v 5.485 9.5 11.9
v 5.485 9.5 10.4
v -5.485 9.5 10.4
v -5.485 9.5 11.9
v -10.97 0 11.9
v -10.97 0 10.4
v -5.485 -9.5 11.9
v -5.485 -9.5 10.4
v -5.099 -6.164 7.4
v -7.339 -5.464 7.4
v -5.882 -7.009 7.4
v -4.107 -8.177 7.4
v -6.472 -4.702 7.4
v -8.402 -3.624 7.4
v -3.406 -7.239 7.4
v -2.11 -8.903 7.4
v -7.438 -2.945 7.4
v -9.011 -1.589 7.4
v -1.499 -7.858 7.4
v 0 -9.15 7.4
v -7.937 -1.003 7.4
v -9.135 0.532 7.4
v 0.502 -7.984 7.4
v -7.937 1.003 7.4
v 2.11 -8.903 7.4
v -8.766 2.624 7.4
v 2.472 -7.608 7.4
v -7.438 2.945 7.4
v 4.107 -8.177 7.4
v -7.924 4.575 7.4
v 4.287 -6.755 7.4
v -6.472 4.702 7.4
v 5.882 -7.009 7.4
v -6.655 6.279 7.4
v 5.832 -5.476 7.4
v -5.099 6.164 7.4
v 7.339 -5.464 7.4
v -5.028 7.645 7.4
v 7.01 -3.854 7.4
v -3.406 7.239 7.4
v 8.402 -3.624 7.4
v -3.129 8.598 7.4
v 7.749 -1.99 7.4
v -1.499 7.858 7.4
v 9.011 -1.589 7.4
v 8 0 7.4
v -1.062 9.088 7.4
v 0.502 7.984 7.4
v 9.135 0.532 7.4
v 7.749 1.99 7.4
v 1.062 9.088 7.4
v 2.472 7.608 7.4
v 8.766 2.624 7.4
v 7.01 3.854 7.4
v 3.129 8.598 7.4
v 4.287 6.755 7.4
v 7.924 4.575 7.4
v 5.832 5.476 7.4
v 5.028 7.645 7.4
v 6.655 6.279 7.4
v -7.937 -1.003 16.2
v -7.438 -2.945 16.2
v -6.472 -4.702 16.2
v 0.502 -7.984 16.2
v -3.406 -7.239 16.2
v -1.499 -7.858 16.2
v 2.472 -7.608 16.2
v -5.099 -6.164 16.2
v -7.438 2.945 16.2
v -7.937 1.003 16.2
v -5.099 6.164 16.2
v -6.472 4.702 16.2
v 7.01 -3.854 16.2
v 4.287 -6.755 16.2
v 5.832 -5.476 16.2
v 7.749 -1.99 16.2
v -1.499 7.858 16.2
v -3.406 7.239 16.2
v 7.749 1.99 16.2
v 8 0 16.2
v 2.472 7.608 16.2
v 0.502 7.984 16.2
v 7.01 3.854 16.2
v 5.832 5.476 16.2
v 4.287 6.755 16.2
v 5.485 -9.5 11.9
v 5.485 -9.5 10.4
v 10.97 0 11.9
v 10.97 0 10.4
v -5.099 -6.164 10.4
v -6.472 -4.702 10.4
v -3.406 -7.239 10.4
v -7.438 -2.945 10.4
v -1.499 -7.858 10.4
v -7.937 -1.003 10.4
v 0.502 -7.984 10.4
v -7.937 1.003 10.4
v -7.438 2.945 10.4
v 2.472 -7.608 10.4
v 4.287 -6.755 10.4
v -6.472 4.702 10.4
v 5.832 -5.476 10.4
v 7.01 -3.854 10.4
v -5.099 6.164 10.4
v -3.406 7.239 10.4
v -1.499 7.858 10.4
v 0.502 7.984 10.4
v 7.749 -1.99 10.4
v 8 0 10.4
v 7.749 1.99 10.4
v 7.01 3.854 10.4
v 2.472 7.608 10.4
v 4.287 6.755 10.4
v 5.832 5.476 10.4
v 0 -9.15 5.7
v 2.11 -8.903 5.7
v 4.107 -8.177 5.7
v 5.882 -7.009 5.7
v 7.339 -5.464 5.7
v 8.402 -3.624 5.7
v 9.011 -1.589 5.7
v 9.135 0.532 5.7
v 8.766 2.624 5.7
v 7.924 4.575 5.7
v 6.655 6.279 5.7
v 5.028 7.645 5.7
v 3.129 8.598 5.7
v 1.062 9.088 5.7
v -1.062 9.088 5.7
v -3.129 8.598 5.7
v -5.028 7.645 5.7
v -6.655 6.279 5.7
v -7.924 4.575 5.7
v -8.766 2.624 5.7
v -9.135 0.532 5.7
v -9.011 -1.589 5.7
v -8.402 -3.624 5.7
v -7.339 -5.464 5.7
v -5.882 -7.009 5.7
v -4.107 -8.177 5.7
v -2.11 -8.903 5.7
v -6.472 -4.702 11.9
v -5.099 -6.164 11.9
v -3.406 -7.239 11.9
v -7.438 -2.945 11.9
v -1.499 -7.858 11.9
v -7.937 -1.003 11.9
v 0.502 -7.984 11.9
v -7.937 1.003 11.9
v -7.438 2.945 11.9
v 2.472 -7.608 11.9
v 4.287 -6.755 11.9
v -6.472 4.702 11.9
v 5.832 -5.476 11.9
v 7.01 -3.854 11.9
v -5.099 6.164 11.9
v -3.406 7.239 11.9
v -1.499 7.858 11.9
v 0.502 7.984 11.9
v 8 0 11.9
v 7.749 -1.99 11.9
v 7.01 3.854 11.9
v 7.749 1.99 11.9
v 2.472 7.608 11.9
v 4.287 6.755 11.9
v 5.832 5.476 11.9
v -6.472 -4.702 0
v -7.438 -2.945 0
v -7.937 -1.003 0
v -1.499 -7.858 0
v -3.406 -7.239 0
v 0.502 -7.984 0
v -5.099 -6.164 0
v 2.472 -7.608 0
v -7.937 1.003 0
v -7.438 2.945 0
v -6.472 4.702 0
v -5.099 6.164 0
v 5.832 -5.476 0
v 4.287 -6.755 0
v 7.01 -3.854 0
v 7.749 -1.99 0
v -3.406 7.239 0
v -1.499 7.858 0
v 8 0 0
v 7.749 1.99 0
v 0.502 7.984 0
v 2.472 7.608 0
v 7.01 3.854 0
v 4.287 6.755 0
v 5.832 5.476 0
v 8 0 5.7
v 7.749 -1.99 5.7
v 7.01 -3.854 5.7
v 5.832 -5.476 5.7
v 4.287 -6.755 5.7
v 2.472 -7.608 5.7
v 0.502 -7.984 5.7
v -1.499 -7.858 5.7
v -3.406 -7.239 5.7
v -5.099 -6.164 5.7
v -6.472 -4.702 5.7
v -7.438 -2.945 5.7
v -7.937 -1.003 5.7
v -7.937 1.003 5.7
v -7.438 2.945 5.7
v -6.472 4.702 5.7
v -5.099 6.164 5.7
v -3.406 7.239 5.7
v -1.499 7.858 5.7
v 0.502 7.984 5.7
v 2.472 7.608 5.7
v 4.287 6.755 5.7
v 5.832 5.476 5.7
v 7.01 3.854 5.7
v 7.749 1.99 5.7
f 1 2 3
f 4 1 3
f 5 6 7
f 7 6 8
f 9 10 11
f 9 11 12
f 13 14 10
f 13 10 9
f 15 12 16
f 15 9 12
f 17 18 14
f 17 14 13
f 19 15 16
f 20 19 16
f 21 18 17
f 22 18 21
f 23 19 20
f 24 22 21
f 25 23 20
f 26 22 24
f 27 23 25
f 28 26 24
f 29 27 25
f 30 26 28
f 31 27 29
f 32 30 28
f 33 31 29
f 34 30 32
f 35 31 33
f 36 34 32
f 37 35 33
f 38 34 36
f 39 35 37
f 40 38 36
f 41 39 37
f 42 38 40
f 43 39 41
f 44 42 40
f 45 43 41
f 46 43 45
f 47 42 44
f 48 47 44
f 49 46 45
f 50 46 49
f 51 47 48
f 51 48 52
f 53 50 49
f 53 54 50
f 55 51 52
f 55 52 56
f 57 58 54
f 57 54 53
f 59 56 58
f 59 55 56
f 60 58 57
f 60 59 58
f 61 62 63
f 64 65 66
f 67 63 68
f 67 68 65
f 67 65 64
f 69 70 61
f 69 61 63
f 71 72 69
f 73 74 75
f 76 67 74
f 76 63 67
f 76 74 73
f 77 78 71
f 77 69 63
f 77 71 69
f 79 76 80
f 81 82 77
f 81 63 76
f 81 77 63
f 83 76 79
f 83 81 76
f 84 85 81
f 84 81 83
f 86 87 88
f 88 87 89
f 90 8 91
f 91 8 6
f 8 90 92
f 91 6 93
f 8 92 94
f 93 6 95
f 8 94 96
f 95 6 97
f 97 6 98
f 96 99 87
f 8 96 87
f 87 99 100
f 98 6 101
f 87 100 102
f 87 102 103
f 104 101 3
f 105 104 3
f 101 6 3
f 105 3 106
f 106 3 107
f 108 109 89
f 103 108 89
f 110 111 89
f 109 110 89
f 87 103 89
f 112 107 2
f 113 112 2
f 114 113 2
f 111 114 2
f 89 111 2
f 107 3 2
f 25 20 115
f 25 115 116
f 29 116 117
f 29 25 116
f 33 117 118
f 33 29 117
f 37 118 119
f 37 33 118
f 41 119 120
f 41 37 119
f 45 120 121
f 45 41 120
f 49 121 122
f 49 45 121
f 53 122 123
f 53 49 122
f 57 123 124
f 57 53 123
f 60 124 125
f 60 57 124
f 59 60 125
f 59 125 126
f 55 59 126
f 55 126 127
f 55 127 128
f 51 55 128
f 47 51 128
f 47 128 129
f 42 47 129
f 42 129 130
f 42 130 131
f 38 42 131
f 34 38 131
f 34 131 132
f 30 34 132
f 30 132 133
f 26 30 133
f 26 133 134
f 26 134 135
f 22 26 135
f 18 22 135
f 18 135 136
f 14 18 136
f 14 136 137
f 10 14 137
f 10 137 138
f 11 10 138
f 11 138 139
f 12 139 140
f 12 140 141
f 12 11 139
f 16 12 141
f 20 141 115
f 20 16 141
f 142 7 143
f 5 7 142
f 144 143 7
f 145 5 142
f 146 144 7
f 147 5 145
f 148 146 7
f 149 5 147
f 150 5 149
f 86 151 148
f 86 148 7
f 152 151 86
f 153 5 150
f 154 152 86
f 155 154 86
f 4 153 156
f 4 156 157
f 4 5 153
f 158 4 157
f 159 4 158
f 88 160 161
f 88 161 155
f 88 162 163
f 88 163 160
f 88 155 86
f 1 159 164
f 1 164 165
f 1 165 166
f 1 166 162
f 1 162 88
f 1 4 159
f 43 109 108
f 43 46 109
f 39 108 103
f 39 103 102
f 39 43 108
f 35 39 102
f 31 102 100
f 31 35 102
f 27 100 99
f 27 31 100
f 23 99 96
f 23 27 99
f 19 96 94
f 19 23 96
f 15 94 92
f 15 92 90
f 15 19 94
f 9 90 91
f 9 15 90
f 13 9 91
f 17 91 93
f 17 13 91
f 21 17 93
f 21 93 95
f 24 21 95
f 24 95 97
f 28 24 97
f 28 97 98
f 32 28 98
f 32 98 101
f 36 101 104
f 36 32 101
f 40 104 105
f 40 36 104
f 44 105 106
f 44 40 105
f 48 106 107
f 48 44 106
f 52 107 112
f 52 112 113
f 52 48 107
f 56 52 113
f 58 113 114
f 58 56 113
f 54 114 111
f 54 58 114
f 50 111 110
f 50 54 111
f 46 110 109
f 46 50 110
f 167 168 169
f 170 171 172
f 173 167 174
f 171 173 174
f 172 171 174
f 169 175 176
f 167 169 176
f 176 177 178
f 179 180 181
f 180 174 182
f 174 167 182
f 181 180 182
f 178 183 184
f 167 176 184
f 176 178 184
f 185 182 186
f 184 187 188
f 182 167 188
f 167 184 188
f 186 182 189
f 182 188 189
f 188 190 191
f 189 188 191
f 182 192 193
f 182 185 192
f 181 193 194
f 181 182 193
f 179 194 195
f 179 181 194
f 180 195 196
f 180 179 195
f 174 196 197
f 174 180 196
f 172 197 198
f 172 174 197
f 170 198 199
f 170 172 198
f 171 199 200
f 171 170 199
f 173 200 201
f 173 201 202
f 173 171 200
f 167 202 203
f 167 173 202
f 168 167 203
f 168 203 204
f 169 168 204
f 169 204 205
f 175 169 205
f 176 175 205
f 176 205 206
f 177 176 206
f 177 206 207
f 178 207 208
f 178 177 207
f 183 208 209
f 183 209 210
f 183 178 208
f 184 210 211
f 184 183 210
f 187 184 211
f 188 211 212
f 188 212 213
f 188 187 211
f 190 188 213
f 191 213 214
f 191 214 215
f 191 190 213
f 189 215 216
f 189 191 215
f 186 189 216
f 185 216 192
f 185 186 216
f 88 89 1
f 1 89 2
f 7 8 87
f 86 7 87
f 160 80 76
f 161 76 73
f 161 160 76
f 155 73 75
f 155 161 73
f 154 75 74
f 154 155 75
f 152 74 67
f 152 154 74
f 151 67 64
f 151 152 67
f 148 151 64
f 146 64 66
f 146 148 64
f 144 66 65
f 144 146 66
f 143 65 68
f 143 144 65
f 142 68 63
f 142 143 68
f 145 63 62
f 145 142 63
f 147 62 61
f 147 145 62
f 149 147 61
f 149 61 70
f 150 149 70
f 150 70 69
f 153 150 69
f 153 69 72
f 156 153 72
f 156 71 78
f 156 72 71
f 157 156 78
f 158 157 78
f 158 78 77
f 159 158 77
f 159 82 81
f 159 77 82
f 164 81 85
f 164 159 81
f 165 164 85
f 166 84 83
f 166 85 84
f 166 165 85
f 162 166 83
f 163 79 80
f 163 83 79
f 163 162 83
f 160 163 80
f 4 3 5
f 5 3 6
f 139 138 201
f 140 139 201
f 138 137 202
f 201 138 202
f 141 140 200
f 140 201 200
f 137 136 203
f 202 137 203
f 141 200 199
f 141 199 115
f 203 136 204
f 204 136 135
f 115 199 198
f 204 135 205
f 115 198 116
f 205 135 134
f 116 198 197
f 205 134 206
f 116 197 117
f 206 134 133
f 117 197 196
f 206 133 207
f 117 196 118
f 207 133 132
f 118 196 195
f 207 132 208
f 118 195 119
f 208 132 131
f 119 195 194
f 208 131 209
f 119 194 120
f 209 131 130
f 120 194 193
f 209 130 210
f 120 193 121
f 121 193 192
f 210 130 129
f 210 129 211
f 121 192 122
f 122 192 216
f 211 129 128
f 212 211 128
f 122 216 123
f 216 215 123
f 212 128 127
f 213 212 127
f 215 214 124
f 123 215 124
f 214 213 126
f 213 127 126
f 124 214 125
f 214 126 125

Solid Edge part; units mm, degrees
sketch "Sketch1" plane through (0, 0, 0) normal (0, 0, 1) x (1, 0, 0)
  circle A0 centre (0, 0) radius 8
extrude "Protrusion1" add sketch "Sketch1" along normal blind 16.2
sketch "Sketch2" plane through (0, 0, 7.4) normal (0, 0, 1) x (0, -1, 0)
  circle A0 centre (0, 0) radius 9.15
extrude "ExtrudedProtrusion_2" add sketch "Sketch2" against normal blind 1.7
sketch "Sketch3" plane through (0, 0, 10.4) normal (0, 0, 1) x (0, -1, 0)
  line L0 (0, 10.9697) -> (-9.5, 5.4848)
  line L1 (-9.5, 5.4848) -> (-9.5, -5.4848)
  line L2 (-9.5, -5.4848) -> (0, -10.9697)
  line L3 (0, -10.9697) -> (9.5, -5.4848)
  line L4 (9.5, -5.4848) -> (9.5, 5.4848)
  line L5 (9.5, 5.4848) -> (0, 10.9697)
extrude "ExtrudedProtrusion_3" add sketch "Sketch3" along normal blind 1.5
